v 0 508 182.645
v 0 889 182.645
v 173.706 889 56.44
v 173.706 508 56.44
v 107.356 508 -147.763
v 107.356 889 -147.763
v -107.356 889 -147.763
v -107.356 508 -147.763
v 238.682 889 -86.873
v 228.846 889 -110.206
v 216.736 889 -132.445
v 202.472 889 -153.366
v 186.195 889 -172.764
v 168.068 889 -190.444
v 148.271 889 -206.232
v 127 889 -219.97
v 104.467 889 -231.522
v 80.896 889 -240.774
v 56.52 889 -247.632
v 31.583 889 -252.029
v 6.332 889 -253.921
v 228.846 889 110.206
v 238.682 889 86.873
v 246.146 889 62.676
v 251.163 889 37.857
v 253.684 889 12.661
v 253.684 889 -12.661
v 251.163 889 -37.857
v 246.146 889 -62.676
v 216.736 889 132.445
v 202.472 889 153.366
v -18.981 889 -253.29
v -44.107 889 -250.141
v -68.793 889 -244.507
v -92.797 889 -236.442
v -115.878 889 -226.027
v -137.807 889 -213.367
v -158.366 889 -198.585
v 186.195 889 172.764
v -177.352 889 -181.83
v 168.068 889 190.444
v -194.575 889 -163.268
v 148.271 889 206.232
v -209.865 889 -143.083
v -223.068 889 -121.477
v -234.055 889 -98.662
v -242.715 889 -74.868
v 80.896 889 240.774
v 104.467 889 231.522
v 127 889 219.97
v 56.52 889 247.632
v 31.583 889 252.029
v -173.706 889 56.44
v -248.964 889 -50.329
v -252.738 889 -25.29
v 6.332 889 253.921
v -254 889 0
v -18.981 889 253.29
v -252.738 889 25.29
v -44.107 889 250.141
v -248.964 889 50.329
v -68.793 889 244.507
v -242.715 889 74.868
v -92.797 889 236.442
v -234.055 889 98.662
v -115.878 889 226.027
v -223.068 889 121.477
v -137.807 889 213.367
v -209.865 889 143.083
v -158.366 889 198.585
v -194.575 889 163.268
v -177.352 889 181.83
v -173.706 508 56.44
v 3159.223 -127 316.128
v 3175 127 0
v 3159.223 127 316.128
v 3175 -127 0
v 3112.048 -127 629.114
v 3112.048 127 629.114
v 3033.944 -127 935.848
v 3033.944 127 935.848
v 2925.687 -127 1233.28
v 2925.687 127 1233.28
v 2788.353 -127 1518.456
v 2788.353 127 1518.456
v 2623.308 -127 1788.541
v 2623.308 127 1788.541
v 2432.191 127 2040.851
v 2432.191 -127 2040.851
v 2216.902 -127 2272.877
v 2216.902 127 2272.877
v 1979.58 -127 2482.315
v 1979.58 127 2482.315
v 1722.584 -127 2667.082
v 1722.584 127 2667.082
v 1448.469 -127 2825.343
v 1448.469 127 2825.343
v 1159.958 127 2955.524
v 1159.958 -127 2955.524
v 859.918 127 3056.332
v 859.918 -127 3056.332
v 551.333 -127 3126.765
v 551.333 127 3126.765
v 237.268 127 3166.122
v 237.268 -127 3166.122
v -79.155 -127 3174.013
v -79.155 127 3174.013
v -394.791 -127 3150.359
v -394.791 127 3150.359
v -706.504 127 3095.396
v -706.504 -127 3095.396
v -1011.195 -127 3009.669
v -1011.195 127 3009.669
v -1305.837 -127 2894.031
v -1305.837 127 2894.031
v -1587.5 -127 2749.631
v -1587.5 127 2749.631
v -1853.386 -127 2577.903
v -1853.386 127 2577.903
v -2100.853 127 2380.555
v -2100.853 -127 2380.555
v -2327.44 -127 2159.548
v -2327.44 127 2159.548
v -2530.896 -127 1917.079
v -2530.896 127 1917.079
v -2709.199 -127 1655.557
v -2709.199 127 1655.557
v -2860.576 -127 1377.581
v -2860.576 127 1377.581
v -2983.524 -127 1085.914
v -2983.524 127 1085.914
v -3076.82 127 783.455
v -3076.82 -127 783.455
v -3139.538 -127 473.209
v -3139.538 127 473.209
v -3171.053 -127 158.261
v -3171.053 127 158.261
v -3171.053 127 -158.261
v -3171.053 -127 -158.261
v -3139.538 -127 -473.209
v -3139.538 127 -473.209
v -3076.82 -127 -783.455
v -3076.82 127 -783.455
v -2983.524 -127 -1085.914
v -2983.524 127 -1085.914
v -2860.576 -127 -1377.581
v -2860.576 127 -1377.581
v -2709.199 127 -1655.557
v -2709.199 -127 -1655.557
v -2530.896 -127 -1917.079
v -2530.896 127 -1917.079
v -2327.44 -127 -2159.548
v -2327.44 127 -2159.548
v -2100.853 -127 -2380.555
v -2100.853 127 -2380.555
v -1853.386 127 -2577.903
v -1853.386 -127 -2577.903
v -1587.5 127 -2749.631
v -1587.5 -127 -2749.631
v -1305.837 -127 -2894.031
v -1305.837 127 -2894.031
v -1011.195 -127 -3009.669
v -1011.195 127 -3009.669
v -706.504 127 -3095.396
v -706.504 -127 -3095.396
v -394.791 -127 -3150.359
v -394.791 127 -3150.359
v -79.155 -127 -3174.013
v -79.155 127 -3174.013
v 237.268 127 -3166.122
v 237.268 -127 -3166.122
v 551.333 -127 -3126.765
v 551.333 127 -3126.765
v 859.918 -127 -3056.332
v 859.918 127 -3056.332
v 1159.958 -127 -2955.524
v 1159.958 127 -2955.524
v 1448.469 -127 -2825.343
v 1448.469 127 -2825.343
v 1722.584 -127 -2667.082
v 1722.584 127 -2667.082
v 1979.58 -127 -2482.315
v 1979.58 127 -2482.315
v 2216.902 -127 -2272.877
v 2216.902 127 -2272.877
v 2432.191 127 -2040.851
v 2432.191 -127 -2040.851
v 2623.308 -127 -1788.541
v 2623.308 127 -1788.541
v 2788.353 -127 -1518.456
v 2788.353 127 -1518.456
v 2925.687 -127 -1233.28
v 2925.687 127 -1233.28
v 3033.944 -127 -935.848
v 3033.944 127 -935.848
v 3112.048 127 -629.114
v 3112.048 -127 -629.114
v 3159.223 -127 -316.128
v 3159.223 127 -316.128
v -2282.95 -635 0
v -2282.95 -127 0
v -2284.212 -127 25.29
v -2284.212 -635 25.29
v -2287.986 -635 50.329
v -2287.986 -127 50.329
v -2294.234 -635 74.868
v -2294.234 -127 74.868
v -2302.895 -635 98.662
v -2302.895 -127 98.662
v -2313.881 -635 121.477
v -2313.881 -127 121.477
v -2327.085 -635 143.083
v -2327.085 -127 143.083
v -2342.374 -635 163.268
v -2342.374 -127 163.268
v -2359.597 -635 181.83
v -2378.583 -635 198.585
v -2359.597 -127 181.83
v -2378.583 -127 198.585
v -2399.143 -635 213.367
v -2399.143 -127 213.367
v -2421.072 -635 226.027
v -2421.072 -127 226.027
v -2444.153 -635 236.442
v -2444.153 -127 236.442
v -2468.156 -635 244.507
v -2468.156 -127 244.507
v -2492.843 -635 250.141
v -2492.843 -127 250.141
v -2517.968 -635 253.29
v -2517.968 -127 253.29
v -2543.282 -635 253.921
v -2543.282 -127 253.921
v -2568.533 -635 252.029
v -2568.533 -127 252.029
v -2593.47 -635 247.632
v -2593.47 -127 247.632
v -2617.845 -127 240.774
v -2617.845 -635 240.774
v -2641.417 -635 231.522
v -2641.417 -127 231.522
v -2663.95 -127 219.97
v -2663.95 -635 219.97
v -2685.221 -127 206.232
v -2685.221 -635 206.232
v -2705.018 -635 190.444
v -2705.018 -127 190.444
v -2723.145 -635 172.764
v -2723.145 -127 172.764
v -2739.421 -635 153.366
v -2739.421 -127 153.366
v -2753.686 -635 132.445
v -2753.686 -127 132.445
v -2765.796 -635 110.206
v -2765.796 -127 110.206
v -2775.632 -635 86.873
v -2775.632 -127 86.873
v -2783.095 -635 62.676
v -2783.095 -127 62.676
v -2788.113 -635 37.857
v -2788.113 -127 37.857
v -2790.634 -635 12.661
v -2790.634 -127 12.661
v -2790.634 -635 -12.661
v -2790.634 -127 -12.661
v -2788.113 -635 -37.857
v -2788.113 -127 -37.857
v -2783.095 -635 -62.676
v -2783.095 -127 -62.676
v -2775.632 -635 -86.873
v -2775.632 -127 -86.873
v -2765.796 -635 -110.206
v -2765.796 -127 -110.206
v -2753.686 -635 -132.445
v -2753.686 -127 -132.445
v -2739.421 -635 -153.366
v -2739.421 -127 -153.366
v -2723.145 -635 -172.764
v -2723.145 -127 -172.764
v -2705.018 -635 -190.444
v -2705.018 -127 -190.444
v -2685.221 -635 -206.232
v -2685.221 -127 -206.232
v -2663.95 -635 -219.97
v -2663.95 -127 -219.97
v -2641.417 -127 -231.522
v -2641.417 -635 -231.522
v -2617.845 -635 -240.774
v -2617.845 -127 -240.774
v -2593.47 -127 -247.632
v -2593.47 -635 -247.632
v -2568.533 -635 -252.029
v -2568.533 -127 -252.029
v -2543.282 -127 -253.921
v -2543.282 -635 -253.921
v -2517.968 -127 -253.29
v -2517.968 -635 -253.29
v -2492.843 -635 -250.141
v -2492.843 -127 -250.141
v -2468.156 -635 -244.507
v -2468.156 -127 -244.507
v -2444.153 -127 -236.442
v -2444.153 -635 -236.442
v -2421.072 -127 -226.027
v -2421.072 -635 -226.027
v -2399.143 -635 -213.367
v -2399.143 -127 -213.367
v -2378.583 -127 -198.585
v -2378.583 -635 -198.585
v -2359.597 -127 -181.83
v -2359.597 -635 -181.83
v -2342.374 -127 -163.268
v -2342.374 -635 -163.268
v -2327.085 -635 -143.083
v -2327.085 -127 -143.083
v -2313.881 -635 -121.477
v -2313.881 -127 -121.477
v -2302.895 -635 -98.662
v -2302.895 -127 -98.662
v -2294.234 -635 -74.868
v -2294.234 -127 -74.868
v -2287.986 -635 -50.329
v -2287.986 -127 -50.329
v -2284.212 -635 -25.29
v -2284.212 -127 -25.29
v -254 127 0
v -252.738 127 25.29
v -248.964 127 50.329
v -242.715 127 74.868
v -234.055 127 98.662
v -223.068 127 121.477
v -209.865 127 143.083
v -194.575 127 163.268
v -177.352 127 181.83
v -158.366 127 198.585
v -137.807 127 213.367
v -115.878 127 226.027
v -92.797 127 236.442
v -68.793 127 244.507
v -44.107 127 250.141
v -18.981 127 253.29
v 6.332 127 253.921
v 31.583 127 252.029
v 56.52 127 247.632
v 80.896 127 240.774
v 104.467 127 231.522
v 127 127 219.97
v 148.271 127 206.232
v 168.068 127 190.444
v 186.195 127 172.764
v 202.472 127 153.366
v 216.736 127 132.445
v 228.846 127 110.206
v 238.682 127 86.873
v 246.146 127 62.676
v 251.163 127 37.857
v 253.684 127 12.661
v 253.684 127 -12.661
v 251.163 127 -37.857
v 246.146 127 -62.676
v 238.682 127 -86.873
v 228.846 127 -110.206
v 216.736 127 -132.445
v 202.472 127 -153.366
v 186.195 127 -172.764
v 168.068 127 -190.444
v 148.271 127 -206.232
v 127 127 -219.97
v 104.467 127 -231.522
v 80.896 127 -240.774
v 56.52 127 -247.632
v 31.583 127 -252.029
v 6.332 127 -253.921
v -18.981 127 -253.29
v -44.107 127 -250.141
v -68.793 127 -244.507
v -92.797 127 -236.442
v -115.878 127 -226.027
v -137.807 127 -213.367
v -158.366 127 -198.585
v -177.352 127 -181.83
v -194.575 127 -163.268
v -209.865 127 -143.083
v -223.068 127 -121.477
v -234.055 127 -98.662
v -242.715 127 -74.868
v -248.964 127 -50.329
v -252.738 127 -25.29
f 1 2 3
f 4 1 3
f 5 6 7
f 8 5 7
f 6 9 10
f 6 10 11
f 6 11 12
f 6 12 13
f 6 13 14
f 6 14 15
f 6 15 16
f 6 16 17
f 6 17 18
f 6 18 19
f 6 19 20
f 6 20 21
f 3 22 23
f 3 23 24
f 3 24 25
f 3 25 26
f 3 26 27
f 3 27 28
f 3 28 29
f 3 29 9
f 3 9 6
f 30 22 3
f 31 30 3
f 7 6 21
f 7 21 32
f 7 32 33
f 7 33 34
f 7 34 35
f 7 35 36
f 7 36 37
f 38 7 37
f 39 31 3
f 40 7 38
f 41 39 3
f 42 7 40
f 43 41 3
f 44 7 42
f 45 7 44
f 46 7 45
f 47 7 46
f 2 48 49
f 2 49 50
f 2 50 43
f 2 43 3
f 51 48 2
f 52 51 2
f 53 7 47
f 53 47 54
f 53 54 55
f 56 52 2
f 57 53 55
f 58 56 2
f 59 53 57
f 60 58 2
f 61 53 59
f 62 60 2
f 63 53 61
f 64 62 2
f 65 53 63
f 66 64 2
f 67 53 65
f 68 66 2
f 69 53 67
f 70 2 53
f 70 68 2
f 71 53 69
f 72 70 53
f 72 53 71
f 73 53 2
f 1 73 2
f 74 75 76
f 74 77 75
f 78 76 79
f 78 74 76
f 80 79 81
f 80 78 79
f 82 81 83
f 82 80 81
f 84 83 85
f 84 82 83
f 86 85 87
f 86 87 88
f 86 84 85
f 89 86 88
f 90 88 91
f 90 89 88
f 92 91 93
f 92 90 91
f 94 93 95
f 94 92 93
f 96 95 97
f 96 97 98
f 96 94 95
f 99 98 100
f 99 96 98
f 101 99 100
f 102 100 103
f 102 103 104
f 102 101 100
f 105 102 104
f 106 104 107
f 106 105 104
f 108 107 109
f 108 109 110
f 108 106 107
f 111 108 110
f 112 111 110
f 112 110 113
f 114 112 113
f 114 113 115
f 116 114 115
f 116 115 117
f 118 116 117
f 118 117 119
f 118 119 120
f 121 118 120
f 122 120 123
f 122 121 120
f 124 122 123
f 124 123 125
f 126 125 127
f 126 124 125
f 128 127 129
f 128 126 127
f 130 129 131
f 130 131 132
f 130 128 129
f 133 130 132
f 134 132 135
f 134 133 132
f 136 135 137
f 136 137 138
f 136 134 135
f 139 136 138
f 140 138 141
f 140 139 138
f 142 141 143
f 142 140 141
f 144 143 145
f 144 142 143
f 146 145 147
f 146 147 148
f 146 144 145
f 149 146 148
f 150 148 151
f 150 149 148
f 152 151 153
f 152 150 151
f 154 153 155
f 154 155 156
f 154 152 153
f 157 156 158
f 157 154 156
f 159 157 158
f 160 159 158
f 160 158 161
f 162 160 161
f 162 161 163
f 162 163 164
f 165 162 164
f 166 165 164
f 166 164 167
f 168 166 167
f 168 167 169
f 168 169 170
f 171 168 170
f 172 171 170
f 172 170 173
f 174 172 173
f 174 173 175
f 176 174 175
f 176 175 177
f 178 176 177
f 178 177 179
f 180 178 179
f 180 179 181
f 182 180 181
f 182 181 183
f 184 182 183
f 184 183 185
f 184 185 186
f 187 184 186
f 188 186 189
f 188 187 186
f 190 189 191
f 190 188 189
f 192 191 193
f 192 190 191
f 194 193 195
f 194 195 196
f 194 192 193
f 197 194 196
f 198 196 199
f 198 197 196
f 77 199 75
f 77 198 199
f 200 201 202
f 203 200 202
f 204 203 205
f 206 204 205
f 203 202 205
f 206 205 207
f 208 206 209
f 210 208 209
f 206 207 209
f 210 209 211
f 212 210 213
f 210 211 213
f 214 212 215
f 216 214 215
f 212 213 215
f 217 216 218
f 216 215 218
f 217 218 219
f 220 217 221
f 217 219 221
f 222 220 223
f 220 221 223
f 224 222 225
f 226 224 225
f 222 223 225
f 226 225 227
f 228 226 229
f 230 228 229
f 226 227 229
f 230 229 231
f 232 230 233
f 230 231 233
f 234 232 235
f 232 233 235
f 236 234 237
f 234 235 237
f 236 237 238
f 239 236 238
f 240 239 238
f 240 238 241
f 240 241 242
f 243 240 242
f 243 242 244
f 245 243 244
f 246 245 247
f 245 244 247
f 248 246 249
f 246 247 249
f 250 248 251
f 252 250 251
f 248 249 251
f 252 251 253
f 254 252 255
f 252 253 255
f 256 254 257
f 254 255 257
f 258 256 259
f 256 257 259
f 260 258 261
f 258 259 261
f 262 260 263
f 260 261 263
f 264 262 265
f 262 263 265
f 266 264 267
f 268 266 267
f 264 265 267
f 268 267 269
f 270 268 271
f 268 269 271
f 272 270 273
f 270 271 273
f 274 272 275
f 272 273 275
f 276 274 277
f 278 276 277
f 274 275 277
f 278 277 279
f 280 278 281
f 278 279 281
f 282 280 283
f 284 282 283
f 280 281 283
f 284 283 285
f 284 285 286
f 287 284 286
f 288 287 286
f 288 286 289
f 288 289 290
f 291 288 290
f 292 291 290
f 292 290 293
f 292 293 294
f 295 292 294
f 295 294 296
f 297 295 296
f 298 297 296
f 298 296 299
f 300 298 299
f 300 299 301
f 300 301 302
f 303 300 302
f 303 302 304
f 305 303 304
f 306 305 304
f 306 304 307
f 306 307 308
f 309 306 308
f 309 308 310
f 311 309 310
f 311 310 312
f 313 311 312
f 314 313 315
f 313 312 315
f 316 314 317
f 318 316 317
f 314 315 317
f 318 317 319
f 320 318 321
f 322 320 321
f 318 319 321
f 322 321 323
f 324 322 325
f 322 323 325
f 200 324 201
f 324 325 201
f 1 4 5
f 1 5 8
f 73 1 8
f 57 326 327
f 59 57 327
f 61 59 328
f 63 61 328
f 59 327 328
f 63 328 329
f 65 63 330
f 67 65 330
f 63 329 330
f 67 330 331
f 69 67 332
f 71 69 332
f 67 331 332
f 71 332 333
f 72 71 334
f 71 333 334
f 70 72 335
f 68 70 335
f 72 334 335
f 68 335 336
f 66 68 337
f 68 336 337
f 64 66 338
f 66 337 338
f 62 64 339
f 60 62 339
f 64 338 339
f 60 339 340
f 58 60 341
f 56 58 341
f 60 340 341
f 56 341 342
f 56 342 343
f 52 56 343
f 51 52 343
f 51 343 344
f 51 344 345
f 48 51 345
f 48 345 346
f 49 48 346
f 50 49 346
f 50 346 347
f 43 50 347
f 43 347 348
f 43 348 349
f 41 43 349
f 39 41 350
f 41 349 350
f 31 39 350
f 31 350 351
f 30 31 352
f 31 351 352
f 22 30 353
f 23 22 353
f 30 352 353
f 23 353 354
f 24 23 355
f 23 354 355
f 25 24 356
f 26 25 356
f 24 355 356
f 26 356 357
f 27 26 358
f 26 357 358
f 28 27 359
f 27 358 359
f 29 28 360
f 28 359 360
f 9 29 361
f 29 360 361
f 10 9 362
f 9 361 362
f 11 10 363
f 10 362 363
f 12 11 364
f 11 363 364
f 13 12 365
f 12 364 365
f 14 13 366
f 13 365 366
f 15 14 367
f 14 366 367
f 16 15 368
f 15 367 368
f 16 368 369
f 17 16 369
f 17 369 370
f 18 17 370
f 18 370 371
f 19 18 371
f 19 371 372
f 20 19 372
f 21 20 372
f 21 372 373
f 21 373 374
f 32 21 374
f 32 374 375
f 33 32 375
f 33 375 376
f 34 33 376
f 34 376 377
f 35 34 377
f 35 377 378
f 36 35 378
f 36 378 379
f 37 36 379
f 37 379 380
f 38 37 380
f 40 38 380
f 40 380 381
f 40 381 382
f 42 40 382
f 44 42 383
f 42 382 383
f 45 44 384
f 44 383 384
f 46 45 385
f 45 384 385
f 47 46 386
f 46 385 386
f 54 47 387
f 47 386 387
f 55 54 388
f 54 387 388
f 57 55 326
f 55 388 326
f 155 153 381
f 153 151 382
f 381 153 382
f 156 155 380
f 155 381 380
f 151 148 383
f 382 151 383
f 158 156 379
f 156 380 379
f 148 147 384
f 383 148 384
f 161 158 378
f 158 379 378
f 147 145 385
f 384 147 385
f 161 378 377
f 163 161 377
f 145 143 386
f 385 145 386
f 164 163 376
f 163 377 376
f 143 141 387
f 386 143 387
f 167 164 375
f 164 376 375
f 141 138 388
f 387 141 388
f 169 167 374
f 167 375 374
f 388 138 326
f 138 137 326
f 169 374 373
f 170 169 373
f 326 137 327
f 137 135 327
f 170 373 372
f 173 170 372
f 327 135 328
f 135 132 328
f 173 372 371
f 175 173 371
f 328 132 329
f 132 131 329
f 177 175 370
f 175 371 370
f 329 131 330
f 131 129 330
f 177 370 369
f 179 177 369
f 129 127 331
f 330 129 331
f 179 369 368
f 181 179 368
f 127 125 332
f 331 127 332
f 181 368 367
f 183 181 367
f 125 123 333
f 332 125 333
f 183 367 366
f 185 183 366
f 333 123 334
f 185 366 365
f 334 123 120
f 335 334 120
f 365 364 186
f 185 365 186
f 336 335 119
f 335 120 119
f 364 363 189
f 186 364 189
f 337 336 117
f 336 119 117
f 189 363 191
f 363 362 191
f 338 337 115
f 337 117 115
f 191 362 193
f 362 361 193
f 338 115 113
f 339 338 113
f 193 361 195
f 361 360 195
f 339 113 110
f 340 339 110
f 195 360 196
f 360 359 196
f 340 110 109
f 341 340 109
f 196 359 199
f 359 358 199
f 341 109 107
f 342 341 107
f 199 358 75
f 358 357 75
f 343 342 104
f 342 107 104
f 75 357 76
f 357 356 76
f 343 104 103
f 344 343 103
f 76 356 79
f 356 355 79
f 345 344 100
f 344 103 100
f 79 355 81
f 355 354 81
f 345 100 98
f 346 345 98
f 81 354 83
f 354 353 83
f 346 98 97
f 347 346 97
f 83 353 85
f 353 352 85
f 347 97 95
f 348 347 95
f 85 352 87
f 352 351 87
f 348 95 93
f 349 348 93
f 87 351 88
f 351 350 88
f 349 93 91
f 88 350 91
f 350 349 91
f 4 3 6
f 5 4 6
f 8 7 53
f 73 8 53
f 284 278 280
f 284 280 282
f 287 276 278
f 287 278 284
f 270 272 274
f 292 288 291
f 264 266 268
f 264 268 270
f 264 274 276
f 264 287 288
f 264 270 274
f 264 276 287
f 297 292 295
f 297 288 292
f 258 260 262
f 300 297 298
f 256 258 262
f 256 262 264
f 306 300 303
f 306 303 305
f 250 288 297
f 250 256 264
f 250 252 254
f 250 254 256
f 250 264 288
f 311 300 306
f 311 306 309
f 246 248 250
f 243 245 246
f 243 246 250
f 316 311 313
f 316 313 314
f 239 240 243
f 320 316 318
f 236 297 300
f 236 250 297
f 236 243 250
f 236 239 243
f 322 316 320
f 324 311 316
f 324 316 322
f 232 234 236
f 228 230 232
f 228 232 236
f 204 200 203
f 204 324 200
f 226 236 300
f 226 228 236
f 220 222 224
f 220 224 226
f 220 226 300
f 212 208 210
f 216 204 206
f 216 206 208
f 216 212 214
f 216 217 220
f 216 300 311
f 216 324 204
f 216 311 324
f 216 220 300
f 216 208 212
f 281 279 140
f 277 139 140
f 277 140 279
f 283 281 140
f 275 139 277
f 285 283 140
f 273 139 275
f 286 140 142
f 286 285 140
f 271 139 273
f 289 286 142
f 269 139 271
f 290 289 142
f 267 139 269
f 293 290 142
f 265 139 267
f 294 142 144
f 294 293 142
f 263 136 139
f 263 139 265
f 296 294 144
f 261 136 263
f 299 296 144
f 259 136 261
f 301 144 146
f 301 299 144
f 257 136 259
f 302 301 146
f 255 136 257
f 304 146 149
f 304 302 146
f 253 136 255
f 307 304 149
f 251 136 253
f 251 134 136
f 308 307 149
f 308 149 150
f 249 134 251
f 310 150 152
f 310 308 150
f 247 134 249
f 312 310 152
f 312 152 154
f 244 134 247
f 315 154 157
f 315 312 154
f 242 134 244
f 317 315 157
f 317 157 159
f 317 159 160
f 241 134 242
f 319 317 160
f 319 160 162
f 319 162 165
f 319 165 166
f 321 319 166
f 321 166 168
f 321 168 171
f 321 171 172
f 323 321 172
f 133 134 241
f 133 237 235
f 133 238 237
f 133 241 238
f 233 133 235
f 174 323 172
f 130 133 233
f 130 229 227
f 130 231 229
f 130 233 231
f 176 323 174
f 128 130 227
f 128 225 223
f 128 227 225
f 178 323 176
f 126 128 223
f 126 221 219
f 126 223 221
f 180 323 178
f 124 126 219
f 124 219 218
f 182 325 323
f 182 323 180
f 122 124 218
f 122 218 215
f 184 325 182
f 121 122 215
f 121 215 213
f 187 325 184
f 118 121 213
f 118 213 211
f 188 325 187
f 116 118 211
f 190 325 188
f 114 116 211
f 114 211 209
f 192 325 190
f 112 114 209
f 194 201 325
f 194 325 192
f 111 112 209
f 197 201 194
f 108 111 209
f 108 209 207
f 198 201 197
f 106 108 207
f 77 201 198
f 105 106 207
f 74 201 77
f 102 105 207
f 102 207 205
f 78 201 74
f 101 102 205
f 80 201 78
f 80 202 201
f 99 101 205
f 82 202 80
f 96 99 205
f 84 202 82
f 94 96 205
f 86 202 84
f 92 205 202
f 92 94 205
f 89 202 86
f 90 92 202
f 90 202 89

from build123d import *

# Parameters (mm, degrees)
F0_R     = 3175
F1_DEPTH = 127
F2_R     = 254
F3_DEPTH = 508
F4_R     = 254
F5_DEPTH = 762
F7_DEPTH = 381


# Not quite as in the source:
# - a feature names something its author has since deleted; it is built from what else it names


with BuildPart() as f1:
    # F0 (on Front) → F1 (new body, symmetric)
    with BuildSketch(Plane.XZ):
        Circle(F0_R)
    extrude(amount=F1_DEPTH, both=True)

    # F2 (on face) → F3 (join)
    with BuildSketch(Plane.XZ.offset(127)):
        with Locations((-2536.9496234023, 0)):
            Circle(F2_R)
    extrude(amount=F3_DEPTH)

    # F4 (on face) → F5 (join)
    with BuildSketch(Plane(origin=(0, 127, 0), x_dir=(-1, 0, 0), z_dir=(0, 1, 0))):
        Circle(F4_R)
    extrude(amount=F5_DEPTH)

    # F6 (on face) → F7 (cut)
    with BuildSketch(Plane(origin=(0, 889, 0), x_dir=(-1, 0, 0), z_dir=(0, 1, 0))):
        Polygon((173.7058100278, 56.4404390281), (0, 182.6450973749), (-173.7058100278, 56.4404390281), (-107.3560946405, -147.7629877156), (107.3560946405, -147.7629877156), align=None)
    extrude(amount=-F7_DEPTH, mode=Mode.SUBTRACT)


solid = f1.part
